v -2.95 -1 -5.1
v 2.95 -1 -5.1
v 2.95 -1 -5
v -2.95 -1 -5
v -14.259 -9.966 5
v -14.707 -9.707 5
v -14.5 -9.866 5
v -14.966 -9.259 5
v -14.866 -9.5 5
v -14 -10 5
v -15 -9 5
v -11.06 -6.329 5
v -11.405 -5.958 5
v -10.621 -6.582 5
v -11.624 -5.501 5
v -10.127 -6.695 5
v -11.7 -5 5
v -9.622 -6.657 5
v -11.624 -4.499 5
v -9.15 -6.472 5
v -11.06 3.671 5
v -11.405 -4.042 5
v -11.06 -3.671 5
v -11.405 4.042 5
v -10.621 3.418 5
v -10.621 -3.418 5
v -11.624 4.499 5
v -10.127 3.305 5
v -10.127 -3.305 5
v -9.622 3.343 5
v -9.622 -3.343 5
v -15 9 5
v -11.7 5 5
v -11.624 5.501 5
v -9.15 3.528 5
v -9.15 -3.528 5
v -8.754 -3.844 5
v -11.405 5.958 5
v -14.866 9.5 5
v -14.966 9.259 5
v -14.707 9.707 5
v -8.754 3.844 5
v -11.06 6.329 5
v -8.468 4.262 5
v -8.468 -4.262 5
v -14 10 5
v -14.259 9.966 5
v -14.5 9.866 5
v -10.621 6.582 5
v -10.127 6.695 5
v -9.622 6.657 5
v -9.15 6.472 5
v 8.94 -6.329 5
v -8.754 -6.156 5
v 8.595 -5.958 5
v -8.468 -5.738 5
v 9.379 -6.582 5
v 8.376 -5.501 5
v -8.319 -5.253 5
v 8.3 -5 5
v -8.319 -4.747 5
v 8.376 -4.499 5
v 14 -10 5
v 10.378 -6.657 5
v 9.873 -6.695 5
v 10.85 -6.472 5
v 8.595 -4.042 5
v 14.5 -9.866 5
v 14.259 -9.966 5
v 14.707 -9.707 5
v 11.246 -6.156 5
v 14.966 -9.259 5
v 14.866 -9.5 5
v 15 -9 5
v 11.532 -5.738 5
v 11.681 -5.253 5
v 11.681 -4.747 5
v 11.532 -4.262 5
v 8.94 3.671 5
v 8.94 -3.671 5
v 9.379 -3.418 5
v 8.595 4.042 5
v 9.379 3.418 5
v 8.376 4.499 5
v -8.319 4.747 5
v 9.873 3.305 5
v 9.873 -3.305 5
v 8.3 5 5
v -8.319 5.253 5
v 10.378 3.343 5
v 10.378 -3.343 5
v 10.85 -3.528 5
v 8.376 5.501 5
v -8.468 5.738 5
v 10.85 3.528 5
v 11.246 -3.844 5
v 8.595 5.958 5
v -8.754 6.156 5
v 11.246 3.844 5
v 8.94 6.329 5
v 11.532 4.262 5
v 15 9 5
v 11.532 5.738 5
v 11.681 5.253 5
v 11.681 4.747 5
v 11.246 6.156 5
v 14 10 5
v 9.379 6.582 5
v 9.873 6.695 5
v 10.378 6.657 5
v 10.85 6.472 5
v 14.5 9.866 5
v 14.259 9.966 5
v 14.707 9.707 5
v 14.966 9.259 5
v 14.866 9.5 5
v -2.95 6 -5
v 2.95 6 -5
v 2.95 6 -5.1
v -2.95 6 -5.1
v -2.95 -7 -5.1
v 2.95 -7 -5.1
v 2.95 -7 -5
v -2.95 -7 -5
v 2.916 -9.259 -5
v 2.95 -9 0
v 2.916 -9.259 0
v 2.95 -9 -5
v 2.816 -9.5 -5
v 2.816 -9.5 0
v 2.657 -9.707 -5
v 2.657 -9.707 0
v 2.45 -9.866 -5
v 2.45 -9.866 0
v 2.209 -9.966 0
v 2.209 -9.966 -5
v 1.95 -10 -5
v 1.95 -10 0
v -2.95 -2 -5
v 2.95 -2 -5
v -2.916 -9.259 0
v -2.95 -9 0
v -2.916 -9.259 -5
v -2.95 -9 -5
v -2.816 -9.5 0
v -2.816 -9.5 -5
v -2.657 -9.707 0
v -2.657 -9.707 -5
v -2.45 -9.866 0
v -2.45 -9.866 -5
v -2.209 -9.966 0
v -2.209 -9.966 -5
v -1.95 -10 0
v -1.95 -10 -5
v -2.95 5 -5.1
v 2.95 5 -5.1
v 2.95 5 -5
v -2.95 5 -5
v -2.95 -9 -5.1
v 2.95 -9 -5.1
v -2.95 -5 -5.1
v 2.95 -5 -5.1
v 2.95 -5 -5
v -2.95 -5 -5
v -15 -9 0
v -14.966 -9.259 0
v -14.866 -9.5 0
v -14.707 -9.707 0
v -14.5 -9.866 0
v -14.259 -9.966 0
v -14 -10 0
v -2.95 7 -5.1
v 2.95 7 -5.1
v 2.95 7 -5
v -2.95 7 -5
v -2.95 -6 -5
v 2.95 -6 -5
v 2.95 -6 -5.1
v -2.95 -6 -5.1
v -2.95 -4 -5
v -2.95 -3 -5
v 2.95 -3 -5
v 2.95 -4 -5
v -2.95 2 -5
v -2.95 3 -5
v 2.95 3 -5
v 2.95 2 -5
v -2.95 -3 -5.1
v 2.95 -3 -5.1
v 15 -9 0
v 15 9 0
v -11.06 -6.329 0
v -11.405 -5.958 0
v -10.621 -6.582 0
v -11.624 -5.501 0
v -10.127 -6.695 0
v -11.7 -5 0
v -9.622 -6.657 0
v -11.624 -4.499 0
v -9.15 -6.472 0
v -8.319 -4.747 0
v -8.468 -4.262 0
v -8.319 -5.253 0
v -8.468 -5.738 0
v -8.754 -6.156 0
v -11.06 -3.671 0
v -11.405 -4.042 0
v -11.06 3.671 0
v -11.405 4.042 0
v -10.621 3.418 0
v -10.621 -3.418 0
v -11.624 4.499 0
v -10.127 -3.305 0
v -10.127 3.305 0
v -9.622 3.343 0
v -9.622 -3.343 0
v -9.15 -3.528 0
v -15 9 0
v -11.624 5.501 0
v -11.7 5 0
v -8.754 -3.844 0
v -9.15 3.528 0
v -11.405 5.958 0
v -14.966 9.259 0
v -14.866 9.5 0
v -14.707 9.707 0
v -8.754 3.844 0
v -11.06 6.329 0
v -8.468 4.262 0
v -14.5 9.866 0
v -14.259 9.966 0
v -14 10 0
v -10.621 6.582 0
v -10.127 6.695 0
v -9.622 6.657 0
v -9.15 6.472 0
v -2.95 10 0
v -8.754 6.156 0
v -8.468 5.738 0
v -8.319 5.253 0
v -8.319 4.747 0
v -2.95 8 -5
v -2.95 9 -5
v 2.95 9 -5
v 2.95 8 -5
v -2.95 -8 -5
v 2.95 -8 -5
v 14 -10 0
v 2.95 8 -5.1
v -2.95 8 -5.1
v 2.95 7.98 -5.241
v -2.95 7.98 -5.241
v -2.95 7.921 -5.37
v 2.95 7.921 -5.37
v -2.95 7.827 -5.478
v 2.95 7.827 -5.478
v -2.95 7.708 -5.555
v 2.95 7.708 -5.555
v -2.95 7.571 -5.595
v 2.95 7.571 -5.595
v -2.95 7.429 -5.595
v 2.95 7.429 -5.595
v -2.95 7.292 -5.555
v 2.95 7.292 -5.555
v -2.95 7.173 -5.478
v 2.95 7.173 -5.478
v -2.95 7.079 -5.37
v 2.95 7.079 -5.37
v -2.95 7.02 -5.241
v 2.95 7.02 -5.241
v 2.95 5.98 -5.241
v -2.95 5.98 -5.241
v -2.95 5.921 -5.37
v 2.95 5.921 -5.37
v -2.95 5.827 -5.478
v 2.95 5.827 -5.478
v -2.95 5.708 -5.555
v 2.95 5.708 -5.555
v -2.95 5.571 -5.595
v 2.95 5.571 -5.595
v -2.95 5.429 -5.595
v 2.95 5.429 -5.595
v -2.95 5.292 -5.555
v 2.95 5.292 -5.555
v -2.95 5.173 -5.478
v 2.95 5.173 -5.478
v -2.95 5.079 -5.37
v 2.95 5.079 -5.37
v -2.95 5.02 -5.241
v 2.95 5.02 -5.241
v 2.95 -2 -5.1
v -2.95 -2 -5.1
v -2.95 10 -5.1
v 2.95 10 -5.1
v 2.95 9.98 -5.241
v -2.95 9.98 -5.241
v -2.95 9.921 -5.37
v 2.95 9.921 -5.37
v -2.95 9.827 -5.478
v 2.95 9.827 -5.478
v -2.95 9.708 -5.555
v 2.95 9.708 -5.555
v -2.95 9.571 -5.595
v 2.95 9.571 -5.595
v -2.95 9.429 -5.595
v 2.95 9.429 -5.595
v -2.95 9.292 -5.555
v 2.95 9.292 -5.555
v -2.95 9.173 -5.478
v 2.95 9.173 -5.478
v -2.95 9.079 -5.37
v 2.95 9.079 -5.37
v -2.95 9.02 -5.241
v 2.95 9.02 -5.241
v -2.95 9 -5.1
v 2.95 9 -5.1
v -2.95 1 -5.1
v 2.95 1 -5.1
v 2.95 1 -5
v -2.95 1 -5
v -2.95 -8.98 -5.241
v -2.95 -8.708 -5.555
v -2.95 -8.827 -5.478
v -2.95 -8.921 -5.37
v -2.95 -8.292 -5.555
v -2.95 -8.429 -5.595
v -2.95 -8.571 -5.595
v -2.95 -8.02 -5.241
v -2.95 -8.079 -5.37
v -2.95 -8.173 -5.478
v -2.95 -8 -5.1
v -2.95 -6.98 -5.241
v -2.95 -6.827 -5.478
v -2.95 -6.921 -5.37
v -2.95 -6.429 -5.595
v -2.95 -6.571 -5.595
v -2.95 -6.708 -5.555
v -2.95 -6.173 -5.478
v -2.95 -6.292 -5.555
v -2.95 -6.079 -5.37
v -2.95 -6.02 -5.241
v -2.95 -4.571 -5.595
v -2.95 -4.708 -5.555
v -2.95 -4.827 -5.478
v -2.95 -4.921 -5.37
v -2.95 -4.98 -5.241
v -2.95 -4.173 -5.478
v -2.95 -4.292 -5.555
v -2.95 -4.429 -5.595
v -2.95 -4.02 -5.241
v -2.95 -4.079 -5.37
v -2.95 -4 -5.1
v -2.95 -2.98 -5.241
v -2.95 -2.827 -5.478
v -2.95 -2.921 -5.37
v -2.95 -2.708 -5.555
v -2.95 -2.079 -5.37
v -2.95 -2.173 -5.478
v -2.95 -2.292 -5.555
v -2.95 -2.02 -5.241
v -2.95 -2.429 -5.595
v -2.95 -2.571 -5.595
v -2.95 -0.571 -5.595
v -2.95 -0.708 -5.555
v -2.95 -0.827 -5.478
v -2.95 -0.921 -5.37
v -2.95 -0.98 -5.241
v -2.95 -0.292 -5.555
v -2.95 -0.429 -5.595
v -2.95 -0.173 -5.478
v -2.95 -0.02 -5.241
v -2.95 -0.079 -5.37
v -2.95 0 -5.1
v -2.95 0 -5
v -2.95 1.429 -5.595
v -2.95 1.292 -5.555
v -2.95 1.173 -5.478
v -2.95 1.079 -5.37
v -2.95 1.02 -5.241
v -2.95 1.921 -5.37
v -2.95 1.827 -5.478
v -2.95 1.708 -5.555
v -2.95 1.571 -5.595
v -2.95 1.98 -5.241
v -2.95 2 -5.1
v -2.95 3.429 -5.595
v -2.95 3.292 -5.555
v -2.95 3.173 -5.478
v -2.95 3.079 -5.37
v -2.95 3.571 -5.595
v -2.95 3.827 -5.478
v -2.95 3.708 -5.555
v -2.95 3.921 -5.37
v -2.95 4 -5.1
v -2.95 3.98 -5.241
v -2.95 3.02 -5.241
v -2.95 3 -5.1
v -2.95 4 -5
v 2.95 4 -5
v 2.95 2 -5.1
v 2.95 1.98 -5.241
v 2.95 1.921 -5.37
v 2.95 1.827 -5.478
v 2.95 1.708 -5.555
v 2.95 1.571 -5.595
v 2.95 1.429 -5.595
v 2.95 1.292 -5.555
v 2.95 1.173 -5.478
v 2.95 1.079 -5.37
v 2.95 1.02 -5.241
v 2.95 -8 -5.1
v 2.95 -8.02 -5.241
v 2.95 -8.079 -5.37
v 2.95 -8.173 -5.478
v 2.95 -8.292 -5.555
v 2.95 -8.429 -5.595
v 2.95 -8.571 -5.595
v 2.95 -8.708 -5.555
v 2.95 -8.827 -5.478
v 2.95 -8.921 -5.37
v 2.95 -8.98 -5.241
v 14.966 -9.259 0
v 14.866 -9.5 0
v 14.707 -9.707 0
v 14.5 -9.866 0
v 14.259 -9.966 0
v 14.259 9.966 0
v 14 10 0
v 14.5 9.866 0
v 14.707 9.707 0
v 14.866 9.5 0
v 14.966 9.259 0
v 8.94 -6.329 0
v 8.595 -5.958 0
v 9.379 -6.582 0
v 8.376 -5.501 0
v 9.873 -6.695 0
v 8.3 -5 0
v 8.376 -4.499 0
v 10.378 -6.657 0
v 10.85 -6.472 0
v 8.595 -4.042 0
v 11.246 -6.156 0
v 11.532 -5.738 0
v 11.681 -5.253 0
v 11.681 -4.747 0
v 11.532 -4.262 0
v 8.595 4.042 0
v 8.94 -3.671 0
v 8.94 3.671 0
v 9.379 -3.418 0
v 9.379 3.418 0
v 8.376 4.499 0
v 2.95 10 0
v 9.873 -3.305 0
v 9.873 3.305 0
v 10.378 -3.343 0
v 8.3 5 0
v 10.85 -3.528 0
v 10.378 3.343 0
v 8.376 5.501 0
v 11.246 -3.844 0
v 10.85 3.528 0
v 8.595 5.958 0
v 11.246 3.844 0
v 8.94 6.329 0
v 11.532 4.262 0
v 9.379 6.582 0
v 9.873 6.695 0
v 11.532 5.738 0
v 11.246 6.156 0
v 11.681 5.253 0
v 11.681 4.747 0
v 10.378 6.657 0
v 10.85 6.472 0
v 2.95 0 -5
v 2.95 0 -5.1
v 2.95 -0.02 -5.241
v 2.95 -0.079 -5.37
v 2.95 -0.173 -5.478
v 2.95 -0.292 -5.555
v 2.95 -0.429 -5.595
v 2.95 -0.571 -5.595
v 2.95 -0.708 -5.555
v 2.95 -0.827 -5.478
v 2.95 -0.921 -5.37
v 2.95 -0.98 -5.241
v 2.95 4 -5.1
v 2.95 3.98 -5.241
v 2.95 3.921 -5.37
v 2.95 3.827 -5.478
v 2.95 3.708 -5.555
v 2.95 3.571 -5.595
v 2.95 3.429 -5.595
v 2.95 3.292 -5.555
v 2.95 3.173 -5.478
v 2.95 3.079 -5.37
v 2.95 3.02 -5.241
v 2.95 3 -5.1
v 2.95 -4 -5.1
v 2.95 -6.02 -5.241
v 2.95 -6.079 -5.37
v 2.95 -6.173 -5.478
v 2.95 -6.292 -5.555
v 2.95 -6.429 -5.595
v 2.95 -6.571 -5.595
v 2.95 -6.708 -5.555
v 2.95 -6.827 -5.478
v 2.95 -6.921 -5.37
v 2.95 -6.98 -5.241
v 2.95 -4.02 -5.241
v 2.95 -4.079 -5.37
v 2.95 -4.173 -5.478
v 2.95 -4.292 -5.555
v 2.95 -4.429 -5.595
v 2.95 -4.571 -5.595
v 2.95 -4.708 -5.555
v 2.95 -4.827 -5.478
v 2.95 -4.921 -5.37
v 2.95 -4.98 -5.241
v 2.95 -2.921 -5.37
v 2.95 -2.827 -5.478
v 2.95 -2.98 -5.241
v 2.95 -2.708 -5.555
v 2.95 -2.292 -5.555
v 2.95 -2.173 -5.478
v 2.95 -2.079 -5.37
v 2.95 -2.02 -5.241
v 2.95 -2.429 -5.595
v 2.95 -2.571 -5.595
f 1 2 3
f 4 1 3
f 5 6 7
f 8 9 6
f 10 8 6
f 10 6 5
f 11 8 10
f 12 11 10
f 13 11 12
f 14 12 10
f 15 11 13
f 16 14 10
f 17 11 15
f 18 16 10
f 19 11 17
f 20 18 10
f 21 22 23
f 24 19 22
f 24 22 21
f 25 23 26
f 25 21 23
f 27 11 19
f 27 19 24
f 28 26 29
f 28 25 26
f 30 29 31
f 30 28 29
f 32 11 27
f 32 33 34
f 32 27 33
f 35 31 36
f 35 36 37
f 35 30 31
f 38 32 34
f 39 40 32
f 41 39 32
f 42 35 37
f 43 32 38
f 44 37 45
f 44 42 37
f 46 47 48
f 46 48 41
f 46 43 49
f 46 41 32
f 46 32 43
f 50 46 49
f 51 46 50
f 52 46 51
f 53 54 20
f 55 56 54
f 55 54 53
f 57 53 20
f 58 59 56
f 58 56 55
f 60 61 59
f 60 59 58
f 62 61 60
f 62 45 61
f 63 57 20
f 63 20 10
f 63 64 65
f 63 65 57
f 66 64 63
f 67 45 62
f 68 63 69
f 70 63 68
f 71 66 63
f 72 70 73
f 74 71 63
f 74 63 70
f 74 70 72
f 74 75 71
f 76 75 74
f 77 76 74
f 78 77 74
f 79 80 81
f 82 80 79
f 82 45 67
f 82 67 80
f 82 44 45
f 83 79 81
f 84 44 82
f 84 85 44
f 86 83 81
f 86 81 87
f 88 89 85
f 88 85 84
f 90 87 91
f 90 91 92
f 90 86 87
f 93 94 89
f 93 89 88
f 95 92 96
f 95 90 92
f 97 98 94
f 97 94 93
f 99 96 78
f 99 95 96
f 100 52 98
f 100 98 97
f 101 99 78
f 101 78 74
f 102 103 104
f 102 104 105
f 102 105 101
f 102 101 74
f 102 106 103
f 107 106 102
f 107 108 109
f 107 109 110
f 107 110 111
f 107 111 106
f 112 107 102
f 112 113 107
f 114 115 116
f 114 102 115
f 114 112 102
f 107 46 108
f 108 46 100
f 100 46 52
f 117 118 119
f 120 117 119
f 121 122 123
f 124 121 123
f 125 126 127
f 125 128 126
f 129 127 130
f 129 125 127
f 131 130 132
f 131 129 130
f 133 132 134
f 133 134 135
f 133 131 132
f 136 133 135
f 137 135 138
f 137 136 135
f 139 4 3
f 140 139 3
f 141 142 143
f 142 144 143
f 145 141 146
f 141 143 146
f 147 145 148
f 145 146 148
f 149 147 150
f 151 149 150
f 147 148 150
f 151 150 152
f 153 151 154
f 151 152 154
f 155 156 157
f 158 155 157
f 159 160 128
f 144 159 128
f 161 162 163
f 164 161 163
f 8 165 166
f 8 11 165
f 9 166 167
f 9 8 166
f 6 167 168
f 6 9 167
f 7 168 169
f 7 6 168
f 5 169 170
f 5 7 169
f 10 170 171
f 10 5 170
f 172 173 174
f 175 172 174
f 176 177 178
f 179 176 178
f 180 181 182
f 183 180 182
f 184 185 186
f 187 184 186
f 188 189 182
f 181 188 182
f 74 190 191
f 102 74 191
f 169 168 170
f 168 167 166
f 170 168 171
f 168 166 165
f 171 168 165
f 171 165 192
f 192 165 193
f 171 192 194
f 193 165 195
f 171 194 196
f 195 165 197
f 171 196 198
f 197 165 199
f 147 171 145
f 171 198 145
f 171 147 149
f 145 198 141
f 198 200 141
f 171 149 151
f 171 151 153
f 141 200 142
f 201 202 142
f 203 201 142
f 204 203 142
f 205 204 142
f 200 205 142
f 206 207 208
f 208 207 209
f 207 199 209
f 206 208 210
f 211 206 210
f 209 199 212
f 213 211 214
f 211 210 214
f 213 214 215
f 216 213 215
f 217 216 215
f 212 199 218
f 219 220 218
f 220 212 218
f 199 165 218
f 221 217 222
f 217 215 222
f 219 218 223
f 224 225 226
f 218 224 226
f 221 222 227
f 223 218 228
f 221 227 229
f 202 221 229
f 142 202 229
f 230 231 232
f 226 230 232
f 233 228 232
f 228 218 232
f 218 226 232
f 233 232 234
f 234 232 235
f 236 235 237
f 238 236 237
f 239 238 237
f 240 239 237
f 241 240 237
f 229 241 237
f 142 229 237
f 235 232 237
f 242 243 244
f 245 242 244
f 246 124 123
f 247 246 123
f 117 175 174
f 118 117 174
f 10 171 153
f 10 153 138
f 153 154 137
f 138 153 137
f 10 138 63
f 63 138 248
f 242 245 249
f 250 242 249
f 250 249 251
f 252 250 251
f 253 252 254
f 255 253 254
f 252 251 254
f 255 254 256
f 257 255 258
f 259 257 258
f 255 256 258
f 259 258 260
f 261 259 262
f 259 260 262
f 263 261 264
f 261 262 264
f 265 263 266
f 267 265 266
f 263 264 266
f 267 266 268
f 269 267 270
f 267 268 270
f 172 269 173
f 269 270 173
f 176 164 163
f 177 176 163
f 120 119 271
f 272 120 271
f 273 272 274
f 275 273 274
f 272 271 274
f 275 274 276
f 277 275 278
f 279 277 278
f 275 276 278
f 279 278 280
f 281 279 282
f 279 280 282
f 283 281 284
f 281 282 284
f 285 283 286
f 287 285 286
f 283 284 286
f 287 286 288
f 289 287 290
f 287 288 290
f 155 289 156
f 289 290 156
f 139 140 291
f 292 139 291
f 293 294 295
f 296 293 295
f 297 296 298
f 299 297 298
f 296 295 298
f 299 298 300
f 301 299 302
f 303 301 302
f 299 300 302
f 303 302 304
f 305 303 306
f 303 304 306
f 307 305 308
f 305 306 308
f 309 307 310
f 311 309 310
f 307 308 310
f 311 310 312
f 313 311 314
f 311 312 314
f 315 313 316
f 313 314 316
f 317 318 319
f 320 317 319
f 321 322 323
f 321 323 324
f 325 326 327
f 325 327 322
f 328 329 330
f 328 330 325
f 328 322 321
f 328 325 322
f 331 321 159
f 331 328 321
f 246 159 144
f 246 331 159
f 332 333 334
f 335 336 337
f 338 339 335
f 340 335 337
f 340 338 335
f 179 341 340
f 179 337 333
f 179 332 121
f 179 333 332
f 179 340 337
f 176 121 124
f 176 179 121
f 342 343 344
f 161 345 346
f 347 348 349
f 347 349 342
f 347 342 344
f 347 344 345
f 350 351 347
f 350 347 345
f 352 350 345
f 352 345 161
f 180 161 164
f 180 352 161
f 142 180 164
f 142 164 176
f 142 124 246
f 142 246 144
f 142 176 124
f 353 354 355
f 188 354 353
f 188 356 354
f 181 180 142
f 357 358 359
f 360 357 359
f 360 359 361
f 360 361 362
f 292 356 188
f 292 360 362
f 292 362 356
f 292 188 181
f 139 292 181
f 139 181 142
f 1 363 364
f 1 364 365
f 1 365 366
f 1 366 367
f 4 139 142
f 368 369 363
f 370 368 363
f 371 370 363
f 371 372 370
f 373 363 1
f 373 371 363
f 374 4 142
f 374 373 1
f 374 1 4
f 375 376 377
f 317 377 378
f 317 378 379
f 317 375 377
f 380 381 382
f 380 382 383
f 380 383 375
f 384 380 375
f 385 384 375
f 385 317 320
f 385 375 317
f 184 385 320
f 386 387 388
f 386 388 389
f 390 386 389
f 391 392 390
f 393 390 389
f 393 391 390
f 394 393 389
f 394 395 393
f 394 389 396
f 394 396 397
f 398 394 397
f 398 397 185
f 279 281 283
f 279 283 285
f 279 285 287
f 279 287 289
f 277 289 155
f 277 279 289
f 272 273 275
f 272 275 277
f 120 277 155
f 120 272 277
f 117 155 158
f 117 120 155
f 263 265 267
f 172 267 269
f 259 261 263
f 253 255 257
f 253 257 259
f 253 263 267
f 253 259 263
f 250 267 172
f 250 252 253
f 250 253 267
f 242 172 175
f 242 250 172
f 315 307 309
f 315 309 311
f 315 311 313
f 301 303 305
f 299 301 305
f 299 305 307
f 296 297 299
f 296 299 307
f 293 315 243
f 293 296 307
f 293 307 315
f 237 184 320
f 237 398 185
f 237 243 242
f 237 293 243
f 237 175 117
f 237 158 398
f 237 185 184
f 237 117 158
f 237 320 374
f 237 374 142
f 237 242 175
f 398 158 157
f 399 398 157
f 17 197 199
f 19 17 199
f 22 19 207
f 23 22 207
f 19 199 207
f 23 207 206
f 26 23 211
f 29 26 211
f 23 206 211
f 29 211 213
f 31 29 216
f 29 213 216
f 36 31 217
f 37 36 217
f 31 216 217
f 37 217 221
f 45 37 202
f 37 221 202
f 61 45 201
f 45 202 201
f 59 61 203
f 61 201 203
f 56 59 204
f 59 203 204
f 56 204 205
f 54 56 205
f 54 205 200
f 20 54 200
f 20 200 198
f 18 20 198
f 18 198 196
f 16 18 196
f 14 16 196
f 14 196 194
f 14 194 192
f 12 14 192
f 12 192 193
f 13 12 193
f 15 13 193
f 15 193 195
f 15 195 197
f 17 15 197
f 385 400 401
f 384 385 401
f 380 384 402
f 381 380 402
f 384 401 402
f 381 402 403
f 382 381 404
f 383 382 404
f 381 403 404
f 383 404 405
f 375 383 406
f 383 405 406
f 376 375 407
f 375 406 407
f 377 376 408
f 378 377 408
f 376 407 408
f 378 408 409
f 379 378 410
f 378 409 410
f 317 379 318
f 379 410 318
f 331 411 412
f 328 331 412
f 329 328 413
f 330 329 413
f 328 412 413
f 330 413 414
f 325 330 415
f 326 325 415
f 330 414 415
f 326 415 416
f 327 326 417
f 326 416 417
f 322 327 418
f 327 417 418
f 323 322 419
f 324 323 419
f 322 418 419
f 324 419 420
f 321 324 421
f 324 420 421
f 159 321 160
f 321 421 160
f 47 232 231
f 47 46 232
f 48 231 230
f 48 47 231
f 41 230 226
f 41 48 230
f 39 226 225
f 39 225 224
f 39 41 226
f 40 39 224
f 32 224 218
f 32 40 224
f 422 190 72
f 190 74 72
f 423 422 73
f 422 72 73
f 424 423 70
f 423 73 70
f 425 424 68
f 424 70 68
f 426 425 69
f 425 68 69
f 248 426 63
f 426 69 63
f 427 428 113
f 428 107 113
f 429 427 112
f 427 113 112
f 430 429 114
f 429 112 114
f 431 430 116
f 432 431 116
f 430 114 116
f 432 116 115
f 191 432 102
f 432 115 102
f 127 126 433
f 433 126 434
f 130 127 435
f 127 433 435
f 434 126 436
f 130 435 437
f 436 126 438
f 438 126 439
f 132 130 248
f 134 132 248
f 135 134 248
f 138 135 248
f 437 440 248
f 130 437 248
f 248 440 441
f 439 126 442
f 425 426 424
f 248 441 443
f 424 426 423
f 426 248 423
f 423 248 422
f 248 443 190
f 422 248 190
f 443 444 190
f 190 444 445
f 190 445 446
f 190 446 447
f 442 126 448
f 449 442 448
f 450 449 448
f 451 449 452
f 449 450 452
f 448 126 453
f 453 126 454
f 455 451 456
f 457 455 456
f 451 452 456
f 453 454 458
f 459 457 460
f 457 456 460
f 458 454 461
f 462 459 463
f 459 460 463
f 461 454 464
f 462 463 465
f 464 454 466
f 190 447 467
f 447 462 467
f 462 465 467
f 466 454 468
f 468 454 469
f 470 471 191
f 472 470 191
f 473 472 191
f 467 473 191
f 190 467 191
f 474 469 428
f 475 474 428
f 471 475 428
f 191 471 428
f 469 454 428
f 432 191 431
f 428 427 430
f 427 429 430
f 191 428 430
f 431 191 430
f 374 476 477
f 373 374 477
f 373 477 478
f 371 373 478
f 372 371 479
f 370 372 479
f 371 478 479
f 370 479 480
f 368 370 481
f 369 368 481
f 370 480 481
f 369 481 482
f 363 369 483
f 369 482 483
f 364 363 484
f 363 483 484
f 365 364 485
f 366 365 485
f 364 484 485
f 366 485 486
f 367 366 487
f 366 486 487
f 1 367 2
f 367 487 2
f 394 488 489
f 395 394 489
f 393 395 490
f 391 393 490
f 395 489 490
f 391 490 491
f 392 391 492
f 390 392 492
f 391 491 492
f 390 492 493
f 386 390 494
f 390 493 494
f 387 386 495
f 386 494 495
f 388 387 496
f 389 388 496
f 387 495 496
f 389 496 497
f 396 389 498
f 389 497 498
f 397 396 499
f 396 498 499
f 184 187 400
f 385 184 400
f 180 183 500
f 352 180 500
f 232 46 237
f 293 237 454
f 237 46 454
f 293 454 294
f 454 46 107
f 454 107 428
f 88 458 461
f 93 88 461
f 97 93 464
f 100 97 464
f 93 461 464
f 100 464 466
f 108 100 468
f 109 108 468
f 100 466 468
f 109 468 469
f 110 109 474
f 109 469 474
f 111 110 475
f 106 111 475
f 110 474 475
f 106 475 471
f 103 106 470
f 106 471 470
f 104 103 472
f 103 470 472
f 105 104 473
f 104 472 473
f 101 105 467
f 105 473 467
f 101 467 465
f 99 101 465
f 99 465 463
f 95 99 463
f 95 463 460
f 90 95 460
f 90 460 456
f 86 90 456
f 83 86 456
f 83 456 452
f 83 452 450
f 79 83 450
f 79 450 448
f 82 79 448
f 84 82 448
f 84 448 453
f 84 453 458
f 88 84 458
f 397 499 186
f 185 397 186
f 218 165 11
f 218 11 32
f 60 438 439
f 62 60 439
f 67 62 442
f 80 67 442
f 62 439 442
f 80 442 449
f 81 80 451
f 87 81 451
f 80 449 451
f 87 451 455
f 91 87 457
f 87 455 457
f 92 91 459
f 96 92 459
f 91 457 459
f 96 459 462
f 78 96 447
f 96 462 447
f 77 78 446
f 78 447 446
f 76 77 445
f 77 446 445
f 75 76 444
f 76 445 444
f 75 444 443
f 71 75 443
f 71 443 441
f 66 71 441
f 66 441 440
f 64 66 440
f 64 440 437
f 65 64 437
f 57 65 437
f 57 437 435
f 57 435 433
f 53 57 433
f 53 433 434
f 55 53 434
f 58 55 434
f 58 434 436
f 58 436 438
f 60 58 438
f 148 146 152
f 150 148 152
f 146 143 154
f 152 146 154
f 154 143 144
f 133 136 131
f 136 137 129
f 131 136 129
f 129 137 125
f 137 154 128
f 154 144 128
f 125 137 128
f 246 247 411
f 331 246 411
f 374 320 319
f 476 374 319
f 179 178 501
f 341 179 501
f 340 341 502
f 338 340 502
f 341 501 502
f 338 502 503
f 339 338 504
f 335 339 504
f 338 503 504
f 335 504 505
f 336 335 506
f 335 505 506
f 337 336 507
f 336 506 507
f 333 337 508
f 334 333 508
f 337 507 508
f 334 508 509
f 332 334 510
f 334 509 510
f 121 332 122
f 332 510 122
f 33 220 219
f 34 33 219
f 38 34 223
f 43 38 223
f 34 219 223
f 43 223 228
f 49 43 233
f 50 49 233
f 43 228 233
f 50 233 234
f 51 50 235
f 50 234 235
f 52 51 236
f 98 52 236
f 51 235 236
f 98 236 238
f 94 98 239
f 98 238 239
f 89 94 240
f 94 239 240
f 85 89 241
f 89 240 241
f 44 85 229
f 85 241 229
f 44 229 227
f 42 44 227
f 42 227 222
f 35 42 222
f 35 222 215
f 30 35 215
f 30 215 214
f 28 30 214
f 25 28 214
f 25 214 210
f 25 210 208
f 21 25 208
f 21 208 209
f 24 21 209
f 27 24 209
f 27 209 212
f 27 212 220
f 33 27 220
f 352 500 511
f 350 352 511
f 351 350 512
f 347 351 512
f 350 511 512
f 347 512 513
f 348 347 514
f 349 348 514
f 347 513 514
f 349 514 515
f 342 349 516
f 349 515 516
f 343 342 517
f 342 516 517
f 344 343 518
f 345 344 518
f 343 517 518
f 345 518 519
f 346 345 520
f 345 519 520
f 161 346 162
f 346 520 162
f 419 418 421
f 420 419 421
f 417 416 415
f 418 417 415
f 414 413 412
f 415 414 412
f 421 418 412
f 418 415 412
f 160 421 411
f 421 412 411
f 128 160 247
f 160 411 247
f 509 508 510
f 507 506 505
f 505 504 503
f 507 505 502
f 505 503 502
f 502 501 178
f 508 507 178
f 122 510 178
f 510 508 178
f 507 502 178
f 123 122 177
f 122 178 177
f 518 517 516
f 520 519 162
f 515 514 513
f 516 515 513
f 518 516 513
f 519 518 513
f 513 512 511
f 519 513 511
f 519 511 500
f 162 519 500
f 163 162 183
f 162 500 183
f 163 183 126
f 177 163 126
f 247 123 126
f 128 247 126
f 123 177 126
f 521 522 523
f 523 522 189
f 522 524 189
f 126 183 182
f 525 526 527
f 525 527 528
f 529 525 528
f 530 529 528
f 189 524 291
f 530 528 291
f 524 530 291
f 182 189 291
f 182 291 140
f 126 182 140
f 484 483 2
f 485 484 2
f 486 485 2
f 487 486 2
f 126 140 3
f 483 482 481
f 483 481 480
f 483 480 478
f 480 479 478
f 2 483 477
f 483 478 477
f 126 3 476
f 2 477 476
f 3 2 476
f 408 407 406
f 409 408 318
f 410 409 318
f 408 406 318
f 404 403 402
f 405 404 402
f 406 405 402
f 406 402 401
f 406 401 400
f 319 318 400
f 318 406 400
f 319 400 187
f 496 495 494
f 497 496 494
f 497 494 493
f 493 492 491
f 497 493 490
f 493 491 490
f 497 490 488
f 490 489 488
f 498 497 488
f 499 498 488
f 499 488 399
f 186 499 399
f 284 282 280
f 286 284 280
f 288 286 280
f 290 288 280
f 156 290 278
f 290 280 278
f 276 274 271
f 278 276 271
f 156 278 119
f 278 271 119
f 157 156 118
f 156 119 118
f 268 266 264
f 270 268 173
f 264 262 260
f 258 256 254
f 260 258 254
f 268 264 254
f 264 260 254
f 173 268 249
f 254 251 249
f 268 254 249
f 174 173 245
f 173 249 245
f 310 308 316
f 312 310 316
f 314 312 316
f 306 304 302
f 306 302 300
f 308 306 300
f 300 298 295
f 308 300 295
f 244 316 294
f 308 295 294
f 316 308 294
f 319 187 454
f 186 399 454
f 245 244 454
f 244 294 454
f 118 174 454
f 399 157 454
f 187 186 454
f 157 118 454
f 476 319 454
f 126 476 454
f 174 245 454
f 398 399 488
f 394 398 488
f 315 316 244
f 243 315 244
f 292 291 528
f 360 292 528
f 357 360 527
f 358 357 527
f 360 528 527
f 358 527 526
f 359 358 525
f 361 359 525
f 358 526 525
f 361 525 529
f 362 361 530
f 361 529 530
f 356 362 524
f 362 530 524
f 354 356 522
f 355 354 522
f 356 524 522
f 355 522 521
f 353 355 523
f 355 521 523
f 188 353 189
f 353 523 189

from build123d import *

# Parameters (mm, degrees)
OUTER_BLOCK_SKETCH_W               = 30
OUTER_BLOCK_SKETCH_H               = 20
MAIN_BLOCK_DEPTH                   = 5
BELT_TRAP_BLOCK_SKETCH_W           = 5.9
BELT_TRAP_BLOCK_SKETCH_H           = 20
BELT_TRAP_BLOCK_DEPTH              = 5
M3_CLEARANCE_HOLE1_D               = 3.4
BELT_TRAPPING_RIDGE_MASTER_DEPTH   = 5.9
BELT_TRAPPING_RIDGES_PATTERN_COUNT = 10
BELT_TRAPPING_RIDGES_PATTERN_PITCH = 2
PRINT_HELPER_FILLETS_R             = 1


with BuildPart() as part:
    # Outer Block Sketch → Main Block (new body)
    with BuildSketch(Plane.XY):
        Rectangle(OUTER_BLOCK_SKETCH_W, OUTER_BLOCK_SKETCH_H)
    extrude(amount=MAIN_BLOCK_DEPTH)

    # Belt Trap Block Sketch → Belt Trap Block (add)
    with BuildSketch(Plane.XY):
        Rectangle(BELT_TRAP_BLOCK_SKETCH_W, BELT_TRAP_BLOCK_SKETCH_H)
    extrude(amount=-BELT_TRAP_BLOCK_DEPTH)

    # M3 Clearance Hole1 (through all)
    with Locations(Plane.XY.offset(5)):
        with Locations((-10, 5), (10, 5), (-10, -5), (10, -5)):
            Hole(M3_CLEARANCE_HOLE1_D / 2)

    # Belt Trapping Ridges Sketch → Belt Trapping Ridge (Master) (add)
    with BuildSketch(Plane(origin=(2.95, 0, 0), x_dir=(0, 0, -1), z_dir=(1, 0, 0))):
        with BuildLine():
            Line((5, 10), (5.1, 10))
            ThreePointArc((5.1, 10), (5.6, 9.5), (5.1, 9))
            Line((5.1, 9), (5, 9))
            Line((5, 9), (5, 10))
        make_face()
    belt_trapping_ridge_master = extrude(amount=-BELT_TRAPPING_RIDGE_MASTER_DEPTH)

    # Belt Trapping Ridges Pattern: Belt Trapping Ridge (Master) ×10
    with Locations(*[(0, -i * BELT_TRAPPING_RIDGES_PATTERN_PITCH, 0) for i in range(1, BELT_TRAPPING_RIDGES_PATTERN_COUNT)]):
        add(belt_trapping_ridge_master)

    # Print Helper Fillets
    print_helper_fillets_edges = [part.edges().sort_by_distance(p)[0] for p in [
        (15, -10, 2.5),
        (15, 10, 2.5),
        (-15, -10, 2.5),
        (-15, 10, 2.5),
        (-2.95, -10, -2.5),
        (2.95, -10, -2.5),
    ]]
    fillet(print_helper_fillets_edges, radius=PRINT_HELPER_FILLETS_R)


solid = part.part
